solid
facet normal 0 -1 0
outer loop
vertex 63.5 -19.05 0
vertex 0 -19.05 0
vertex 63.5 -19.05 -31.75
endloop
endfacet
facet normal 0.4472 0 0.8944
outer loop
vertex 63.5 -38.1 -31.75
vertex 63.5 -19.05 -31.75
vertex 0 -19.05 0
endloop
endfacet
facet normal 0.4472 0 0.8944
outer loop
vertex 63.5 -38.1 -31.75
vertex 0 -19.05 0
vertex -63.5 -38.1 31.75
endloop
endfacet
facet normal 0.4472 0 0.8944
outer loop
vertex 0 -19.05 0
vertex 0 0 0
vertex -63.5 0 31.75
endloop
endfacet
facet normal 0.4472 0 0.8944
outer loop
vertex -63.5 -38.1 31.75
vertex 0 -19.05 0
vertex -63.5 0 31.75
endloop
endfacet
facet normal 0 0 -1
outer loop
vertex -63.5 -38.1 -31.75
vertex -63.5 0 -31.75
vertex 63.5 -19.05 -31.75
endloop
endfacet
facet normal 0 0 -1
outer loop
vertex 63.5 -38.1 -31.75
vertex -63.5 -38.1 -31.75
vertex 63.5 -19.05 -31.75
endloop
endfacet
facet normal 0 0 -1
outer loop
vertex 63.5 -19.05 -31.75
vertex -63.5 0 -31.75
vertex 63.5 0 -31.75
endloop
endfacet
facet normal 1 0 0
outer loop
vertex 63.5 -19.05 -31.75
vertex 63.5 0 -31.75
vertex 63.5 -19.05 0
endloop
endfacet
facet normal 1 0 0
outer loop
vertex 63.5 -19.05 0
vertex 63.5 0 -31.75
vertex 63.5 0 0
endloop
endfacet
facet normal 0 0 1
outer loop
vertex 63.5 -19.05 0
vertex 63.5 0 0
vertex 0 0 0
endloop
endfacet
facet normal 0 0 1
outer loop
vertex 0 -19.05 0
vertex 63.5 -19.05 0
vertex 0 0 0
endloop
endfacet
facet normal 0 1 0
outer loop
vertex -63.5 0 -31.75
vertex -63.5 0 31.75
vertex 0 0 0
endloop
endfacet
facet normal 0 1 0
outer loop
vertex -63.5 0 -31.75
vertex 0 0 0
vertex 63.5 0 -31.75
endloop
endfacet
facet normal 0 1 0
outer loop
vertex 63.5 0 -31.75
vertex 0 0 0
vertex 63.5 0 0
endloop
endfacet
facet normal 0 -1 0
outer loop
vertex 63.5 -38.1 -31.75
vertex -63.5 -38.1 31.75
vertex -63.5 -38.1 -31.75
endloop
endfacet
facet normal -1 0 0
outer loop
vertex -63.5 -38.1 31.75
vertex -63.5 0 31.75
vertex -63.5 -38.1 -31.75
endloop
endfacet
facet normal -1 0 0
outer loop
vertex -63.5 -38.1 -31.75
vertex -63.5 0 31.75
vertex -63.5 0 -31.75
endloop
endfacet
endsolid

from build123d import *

# Parameters (mm, degrees)
F1_DEPTH = 38.1
F2_DEPTH = 19.05


with BuildPart() as f1:
    # F0 (on Front) → F1 (new body)
    with BuildSketch(Plane.XZ):
        Polygon((-63.5, 31.75), (-63.5, -31.75), (63.5, -31.75), (0, 0), align=None)
    extrude(amount=F1_DEPTH)

    # F0 (on Front) → F2 (join)
    with BuildSketch(Plane.XZ):
        Polygon((-63.5, 31.75), (-63.5, -31.75), (63.5, -31.75), (0, 0), align=None)
        Polygon((0, 0), (63.5, -31.75), (63.5, 0), align=None)
    extrude(amount=F2_DEPTH)


solid = f1.part
